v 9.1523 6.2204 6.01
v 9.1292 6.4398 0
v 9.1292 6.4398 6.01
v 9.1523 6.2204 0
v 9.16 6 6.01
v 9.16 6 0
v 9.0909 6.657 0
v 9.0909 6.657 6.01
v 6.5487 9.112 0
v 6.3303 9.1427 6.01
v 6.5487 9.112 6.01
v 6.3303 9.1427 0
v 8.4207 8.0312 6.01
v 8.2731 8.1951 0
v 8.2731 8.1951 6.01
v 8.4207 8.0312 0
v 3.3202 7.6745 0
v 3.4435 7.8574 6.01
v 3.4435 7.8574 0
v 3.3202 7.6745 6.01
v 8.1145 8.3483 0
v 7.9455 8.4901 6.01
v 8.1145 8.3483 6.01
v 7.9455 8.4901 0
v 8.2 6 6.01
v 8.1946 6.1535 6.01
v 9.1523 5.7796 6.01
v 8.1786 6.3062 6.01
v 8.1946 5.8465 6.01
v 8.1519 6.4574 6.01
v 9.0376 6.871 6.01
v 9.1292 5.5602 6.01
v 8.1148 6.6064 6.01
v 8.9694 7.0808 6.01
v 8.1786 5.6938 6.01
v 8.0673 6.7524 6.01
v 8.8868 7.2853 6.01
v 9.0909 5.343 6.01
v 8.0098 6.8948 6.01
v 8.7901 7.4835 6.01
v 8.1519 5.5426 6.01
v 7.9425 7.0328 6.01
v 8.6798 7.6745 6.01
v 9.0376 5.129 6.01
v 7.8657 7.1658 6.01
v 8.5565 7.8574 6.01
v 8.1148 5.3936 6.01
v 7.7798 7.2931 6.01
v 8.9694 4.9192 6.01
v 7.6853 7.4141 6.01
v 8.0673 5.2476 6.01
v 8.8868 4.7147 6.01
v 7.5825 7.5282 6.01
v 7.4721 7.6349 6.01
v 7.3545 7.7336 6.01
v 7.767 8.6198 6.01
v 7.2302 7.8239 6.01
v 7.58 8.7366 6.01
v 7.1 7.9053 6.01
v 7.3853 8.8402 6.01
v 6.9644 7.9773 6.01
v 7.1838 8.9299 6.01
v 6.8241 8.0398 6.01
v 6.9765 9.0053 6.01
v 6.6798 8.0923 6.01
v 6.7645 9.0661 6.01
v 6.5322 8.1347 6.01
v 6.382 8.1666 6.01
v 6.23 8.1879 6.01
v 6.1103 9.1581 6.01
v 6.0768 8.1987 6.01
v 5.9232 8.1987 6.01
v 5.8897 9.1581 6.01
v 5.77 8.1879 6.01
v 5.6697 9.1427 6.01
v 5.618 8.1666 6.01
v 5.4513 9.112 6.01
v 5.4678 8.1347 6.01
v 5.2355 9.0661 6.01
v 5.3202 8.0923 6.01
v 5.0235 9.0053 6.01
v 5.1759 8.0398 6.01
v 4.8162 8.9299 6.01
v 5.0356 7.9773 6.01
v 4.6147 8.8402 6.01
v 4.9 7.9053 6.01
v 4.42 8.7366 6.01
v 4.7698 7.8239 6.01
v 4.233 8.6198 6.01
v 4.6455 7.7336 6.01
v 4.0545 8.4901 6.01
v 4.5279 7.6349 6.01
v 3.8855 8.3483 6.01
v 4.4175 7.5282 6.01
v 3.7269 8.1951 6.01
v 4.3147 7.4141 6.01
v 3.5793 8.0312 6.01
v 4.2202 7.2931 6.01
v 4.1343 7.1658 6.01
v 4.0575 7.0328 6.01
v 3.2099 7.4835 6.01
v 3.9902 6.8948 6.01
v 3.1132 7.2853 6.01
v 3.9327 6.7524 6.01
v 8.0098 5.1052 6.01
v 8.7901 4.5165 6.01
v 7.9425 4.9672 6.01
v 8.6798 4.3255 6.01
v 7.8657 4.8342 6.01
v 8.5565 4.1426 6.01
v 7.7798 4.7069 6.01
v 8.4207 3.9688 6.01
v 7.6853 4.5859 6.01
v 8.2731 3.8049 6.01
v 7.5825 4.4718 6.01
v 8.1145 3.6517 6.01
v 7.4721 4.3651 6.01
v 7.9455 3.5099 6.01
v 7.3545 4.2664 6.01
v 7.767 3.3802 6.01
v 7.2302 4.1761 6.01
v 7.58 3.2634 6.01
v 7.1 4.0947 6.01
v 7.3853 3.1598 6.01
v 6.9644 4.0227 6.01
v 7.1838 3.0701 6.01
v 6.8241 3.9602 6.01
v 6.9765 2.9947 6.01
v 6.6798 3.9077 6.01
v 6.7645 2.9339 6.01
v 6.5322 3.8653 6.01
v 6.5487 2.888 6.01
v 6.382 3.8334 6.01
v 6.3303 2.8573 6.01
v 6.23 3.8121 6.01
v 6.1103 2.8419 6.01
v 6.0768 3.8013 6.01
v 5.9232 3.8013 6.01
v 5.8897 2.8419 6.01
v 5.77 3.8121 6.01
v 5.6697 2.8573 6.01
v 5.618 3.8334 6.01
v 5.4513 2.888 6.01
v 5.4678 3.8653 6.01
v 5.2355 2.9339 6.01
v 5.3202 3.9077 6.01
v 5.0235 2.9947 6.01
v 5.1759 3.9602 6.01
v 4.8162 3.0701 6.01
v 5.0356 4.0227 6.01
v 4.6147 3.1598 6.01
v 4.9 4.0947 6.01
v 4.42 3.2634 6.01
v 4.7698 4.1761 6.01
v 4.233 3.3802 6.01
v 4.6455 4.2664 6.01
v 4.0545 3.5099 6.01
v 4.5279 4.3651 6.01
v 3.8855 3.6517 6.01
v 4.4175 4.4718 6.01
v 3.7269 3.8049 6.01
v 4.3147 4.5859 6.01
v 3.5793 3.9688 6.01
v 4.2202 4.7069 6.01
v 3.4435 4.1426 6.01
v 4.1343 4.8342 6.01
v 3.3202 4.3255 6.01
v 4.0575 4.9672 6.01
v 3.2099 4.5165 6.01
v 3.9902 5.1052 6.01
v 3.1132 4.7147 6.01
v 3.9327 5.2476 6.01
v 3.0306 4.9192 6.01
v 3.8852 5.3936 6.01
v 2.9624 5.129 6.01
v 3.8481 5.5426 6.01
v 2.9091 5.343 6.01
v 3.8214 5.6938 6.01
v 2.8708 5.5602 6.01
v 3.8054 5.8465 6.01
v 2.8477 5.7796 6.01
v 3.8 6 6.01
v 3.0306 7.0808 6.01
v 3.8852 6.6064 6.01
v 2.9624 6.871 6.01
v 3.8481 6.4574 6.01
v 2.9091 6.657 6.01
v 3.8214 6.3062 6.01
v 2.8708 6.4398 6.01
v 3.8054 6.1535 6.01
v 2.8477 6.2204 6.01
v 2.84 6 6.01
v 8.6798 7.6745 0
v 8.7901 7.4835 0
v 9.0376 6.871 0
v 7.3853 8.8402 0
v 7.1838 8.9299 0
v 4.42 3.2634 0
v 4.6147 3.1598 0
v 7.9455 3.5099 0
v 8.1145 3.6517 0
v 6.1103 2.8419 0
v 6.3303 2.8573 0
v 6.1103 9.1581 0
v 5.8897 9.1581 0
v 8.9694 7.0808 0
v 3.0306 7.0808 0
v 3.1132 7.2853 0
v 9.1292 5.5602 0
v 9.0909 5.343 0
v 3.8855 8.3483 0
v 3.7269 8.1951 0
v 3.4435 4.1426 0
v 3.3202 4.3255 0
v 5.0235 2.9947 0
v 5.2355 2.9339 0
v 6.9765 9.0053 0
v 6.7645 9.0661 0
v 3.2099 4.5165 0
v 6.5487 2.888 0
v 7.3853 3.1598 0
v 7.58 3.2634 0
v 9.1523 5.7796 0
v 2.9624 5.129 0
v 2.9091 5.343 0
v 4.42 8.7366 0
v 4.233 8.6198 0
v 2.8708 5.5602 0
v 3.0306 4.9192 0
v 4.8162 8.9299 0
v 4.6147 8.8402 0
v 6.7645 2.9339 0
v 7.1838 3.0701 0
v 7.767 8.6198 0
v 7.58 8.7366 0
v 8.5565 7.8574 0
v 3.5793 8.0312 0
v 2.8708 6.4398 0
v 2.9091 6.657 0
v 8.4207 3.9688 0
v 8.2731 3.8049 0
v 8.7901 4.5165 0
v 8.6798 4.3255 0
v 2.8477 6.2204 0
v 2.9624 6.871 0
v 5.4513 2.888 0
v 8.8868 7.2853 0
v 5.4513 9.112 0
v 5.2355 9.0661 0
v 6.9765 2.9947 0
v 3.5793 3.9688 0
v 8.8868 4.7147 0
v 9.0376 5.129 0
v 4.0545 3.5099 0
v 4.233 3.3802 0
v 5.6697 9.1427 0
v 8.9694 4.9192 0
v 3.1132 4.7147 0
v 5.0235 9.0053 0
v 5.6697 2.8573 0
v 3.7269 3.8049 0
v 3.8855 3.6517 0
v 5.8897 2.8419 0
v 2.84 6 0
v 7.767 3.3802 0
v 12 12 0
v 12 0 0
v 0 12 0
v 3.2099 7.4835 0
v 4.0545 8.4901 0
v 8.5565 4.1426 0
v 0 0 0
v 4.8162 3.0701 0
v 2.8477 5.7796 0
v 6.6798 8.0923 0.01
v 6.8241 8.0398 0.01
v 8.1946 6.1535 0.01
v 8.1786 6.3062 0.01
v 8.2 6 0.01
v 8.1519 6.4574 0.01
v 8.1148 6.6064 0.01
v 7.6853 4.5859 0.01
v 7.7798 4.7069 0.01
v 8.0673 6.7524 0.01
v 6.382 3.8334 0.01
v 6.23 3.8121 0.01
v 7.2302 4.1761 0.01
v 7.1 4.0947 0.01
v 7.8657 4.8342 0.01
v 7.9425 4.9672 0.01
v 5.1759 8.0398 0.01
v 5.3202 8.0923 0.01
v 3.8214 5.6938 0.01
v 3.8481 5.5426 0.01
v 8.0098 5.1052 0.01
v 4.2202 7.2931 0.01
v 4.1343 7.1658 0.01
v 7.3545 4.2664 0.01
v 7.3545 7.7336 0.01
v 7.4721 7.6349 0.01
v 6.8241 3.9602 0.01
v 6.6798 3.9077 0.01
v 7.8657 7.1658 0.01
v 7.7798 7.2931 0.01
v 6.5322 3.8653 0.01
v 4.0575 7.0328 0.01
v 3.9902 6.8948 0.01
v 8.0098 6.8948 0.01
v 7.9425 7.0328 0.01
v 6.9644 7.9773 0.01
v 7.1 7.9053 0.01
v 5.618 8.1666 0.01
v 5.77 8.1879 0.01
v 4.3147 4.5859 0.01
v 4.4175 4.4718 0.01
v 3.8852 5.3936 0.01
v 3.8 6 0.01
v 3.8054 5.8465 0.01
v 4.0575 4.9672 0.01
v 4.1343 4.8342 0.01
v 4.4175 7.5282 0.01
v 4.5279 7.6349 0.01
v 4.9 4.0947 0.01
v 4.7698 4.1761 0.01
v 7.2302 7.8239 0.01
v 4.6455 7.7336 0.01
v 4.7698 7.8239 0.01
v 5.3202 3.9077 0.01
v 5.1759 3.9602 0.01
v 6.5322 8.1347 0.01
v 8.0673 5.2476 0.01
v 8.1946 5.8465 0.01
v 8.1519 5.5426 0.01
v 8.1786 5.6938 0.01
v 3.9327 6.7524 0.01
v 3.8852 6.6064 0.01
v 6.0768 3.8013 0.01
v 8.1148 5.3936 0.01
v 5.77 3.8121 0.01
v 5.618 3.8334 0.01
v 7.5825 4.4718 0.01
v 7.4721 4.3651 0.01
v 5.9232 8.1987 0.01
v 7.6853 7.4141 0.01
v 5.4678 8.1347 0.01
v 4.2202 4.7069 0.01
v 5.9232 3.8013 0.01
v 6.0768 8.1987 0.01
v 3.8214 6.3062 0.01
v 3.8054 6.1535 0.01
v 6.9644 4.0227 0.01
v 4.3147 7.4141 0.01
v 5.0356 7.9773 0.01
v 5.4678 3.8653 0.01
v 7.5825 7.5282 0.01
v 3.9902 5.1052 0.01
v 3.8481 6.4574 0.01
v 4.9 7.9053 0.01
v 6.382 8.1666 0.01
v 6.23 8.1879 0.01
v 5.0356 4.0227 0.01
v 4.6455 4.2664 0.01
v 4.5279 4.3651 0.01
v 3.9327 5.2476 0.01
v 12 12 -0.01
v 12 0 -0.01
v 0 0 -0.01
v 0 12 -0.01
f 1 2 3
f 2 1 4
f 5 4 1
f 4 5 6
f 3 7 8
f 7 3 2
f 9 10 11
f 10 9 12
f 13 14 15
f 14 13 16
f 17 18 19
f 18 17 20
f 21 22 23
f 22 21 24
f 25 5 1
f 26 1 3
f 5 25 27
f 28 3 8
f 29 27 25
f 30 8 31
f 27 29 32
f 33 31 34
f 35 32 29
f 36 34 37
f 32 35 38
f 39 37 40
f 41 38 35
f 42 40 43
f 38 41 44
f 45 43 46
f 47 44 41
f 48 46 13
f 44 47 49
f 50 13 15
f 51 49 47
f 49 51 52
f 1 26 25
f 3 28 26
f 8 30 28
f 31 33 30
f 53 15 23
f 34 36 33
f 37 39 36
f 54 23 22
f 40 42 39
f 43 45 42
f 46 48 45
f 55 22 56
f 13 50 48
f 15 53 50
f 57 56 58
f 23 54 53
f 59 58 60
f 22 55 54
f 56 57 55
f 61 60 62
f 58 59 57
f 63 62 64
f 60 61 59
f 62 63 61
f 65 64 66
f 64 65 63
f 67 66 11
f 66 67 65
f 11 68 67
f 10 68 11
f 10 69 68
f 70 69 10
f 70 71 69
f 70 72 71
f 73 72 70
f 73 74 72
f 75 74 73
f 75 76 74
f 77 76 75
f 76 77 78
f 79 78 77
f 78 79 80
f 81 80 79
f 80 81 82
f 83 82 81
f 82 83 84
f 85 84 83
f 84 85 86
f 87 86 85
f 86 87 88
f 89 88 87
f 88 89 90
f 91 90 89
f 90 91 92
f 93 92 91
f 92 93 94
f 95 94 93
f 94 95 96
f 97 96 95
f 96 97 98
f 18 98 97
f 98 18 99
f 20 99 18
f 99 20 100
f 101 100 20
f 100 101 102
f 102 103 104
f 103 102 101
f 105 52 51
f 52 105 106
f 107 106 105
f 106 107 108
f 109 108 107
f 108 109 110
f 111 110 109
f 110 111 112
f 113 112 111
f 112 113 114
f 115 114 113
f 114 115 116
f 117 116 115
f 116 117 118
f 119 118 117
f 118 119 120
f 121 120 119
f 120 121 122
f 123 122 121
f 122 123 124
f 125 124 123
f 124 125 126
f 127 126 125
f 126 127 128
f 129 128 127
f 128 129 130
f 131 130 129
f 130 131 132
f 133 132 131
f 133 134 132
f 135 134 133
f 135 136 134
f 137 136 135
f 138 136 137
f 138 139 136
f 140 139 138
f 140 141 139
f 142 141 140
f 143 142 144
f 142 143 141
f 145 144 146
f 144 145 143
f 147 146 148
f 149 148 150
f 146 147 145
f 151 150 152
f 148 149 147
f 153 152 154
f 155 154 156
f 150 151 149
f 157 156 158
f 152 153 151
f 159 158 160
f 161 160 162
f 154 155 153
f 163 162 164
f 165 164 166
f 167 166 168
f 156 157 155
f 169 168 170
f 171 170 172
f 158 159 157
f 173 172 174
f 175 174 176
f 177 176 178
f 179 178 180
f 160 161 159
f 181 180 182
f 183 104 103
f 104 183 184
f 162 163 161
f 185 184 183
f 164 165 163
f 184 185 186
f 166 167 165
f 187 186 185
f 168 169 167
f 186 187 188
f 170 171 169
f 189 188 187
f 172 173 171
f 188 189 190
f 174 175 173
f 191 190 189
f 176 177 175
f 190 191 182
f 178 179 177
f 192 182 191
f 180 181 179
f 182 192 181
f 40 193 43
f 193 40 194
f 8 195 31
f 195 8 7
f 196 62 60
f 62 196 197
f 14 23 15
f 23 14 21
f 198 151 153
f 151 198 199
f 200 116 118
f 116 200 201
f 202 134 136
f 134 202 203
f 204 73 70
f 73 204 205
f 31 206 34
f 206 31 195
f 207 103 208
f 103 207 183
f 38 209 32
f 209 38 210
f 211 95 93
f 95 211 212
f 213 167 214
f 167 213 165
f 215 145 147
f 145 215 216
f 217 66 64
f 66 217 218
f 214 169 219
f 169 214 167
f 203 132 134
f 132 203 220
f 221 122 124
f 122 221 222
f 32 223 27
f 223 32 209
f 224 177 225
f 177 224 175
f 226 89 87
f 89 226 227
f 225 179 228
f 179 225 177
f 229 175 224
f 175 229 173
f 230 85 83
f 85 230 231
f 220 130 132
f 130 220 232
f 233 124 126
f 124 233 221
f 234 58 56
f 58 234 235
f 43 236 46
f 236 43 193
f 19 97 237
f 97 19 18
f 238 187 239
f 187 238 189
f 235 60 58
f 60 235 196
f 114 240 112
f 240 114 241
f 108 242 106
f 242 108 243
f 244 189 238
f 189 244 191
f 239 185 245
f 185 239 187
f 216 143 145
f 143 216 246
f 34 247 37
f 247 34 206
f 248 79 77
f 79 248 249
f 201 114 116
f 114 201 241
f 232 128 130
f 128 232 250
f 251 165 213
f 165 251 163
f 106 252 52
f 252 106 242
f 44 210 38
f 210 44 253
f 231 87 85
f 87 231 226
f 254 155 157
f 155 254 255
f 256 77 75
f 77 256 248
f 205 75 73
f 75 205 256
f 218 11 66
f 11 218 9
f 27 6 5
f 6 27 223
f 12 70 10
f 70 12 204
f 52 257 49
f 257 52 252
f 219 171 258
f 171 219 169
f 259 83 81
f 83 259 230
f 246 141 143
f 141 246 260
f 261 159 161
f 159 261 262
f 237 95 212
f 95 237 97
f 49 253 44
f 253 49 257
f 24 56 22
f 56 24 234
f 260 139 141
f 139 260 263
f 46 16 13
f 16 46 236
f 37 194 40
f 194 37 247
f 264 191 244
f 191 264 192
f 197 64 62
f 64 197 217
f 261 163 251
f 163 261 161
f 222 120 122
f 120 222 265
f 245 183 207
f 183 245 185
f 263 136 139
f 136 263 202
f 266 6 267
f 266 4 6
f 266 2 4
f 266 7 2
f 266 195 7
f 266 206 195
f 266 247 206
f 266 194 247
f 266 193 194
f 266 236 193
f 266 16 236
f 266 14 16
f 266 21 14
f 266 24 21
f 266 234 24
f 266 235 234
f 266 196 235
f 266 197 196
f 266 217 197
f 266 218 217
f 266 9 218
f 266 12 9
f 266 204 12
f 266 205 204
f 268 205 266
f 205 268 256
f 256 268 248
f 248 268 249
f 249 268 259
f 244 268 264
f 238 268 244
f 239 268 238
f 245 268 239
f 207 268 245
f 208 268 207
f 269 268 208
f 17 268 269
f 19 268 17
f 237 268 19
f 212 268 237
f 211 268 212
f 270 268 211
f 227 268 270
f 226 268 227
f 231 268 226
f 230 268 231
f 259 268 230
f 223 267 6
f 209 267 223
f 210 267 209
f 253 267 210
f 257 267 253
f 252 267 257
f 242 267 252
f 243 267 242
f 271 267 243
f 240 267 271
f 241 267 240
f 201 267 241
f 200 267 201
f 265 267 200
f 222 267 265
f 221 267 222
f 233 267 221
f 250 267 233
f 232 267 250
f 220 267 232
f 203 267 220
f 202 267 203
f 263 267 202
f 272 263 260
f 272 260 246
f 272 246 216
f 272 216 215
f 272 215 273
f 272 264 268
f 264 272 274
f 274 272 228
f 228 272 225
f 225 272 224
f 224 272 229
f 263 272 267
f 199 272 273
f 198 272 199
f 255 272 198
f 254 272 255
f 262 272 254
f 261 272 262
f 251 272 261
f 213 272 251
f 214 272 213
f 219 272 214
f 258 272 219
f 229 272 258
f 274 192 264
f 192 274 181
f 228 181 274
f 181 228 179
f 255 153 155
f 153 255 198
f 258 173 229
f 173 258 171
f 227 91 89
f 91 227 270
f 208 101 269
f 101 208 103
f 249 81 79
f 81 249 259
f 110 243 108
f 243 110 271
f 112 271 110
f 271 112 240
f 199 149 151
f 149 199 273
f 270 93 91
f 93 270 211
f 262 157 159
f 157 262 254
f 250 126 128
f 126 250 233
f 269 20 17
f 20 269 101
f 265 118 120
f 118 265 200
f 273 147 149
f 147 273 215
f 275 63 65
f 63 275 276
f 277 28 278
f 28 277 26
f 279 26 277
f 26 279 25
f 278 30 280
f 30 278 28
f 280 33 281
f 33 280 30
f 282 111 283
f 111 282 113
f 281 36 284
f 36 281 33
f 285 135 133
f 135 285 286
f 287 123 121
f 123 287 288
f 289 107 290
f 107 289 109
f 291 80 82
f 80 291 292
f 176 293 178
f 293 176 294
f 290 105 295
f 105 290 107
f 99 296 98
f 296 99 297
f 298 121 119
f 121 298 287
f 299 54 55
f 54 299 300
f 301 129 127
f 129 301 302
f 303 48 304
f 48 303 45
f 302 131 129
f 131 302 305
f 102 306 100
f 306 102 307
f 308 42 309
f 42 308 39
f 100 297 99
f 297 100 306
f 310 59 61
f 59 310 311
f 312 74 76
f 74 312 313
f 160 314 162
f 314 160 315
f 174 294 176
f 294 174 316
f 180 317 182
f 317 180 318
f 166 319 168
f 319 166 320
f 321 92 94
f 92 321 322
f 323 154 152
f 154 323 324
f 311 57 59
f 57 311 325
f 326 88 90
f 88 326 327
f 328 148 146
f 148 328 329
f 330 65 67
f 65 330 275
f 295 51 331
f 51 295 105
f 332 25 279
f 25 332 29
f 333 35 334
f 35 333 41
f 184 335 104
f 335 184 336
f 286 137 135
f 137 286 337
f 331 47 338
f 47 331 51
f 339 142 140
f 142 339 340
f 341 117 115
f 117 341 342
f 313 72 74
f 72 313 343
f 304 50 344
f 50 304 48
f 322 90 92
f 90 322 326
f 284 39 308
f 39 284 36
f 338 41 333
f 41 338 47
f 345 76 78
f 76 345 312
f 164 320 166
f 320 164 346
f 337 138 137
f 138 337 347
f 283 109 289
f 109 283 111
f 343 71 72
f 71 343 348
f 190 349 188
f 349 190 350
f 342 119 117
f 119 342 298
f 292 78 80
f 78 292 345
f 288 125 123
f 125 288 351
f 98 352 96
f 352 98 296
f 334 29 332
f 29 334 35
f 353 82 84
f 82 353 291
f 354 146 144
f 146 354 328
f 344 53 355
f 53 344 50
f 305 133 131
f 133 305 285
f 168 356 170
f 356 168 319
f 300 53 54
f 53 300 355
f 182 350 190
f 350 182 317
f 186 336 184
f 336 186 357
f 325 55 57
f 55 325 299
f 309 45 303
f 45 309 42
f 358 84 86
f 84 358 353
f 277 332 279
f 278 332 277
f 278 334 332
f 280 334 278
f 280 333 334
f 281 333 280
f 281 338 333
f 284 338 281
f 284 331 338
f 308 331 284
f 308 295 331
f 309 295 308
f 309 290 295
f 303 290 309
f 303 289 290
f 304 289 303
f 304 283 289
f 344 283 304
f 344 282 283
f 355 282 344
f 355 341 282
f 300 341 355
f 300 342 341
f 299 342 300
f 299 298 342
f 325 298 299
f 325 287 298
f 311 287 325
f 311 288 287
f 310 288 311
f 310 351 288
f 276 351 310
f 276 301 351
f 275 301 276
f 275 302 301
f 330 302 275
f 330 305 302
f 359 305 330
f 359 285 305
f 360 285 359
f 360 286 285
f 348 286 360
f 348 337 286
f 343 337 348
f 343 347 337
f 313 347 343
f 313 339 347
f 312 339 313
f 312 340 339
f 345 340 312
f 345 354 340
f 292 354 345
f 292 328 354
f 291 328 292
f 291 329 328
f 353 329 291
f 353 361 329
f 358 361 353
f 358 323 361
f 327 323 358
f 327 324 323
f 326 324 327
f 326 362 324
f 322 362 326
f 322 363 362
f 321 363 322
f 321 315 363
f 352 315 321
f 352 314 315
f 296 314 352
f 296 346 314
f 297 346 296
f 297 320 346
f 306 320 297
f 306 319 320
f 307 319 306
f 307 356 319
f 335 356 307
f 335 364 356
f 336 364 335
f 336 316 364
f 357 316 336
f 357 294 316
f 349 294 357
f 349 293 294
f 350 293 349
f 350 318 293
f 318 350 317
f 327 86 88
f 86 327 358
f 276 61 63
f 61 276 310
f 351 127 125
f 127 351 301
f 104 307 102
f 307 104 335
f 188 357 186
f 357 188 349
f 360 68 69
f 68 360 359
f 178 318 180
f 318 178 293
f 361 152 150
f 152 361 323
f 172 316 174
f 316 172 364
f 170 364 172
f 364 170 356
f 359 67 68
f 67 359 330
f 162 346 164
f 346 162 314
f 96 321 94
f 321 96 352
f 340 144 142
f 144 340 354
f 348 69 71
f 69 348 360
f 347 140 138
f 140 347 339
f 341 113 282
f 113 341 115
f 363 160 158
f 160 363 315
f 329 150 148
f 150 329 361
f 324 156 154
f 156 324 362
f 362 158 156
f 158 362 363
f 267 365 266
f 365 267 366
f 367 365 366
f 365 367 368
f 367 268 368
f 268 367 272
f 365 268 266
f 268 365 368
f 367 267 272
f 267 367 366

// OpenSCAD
// file: ../Base/PlacementOptions.scad
// Fischertechnik Box Foundation
// Placement Options

// Alignment
NoAlign = 0;
AlignLeft = 1;
AlignBottom = 2;
AlignCenter = 3;
AlignRight = 4;
AlignTop = 5;

// Element rotation degree steps
rotations = [0, -90, -180, -270];

// Rotation
NoRotation = 0;
Rotate0 = 0;
Rotate90 = 1;
Rotate180 = 2;
Rotate270 = 3;

// Docking (seen from above)
NoDock = -1;
DockLeft = 0;
DockTop = 1;
DockRight = 2;
DockCorner = 2;
DockBottom = 3;

// Web corners
LowerLeft = 0;
UpperLeft = 1;
UpperRight = 2;
LowerRight = 3;

// Web position relative to corner
LeftOfCorner = 0;
RightOfCorner = 1;
// file: ../Base/Boxes.scad
// Fischertechnik Box Foundation
// Pre-designed Boxes

use <Constants.scad>

include <PlacementOptions.scad>

box190Width = 190;
box190Depth = 130;
box130Width = 130;
box130Depth = 95;

// Values are from an original ec3 box
topBottomDifference = 1.5;
outerHeight = 40;
baseThickness = 1.8;
innerHeight = outerHeight - baseThickness;
stackExcess = 5.7;
radius = 3.5;
wallThickness = 1.5;
tolerance = 0.2;

boxWallThickness = wallThickness;
boxBaseThickness = baseThickness;
boxWebWidth = 3.0;

// getBoxWallThickness()
// Gets the wall thickness of a Fischertechnik Box
function getBoxWallThickness() = boxWallThickness;

// getBoxUsageHeight(height = 38.2)
// Gets the usable height of a Fischertechnik box
// height = Outer height of the box from the bottom to the upper edge.
function getBoxUsageHeight(height = outerHeight) = height - baseThickness - stackExcess;

// getBoxInnerHeight()
// Gets the inner height of a Fischertechnik box, including the stack excess
function getBoxInnerHeight() = innerHeight;

// getBoxBaseThickness()
// Gets the thickness of the Fischertechnik box base.
function getBoxBaseThickness() = boxBaseThickness;

// getBoxWebWidth()
// Gets the width of a box web
function getBoxWebWidth() = boxWebWidth;

// getBox190Space()
// Gets the usable inner space of a Box 190 as an x/y-list
function getBox190Space() = [
    box190Width - 2*getBoxWallThickness() - topBottomDifference, 
    box190Depth - 2*getBoxWallThickness() - topBottomDifference ];

// RoundedCornerPlate(width, depth, height, radius)
// Creates a body plate with rounded corners for a box. Used
// also to create the complete box with the hull module.
// width = Width of the plate
// depth = depth of the plate 
// height = thickness of the plate
// radius = radius of the rounded corner
module RoundedCornerPlate(width, depth, height, radius) {
    translate([radius, radius])
    hull() {
        w = width-2*radius;
        d = depth-2*radius;
        cube([w, d, height]);
        cylinder(height, r=radius, $fn=getFragments());
        translate([w, 0])
            cylinder(height, r=radius, $fn=getFragments());
        translate([w, d])
            cylinder(height, r=radius, $fn=getFragments());
        translate([0, d])
            cylinder(height, r=radius, $fn=getFragments());
    }
}

// BoxBase(width, depth)
// Creates an empty stackable Fischertechnik compatible box
// width = Outer width of the box (190, 130, ...)
// depth = Outer depth of the box (130, 95, ...)

module BoxBase(width, depth, height=outerHeight) {    
    thinPlate = 0.01;

    innerHeight = height - baseThickness;    
    
    module Body(tolerance=tolerance) {
        hull() {
            // Bottom with tolerance to fit into the original boxes when stacked
            translate([-wallThickness+tolerance, -wallThickness+tolerance, -baseThickness])
                RoundedCornerPlate(width-topBottomDifference-2*tolerance, depth-topBottomDifference-2*tolerance, thinPlate, radius);
            
            // Top
            translate([-wallThickness-topBottomDifference/2, -wallThickness-topBottomDifference/2, innerHeight-thinPlate])
                RoundedCornerPlate(width, depth, thinPlate, radius);
         }
    }

    module Cutoff() {
        hull() {
            coWidth = width - 2*wallThickness;
            coDepth = depth - 2*wallThickness;
            
            // Bottom
            RoundedCornerPlate(coWidth-topBottomDifference, coDepth-topBottomDifference, thinPlate, radius);

            // Top
            translate([-topBottomDifference/2, -topBottomDifference/2, innerHeight+thinPlate]) 
                RoundedCornerPlate(coWidth, coDepth, thinPlate, radius);
        }
    }
    
    difference() {        
        Body();
        Cutoff();
        stackOffset = innerHeight - stackExcess;
        translate([0, 0, stackOffset + baseThickness])
            Body(tolerance=0);
    }
}

// Creates the Fischertechnik empty box 130x190 mm and places it at position 0,0
// 190x130 are the outer sizes, the inner space is slightly smaller. Use getBox190Space() to get the inner sizes.
// The box is positioned that the usable inner space is at the 0,0,0 position.

module Box190() {
    BoxBase(box190Width, box190Depth);
}

// Gets the usable inner space of a Box 130 as an x/y-list
function getBox130Space() = [
    box130Width - 2*getBoxWallThickness() - topBottomDifference, 
    box130Depth - 2*getBoxWallThickness() - topBottomDifference ];

// Creates the Fischertechnik empty box 95x130 mm and places it at position 0,0
// 190x130 are the outer sizes, the inner space is slightly smaller. Use getBox190Space() to get the inner sizes.
// The box is positioned that the usable inner space is at the 0,0,0 position.

module Box130() {
    BoxBase(box130Width, box130Depth);
}

// Creates a web at the specified box walls
// corner 0 = LowerLeft, 1 = UpperLeft, 2 = UpperRight, 3 = LowerRight
// side 0 = LeftOfCorner, 1 = RightOfCorner
// distance = Distance in mm from the corner
// boxSpace = inner width and depth of the box (default: Box 190)
// webWidth = length of the web (default is 3 mms)
// webThickness = thickness of the web (default is 1 mm)
// height = Height of the web (standard is getBoxUsageHeight())
// sink = How much of the web is sunk into the wall

module BoxWeb(
    corner, 
    side, 
    distance, 
    boxSpace=getBox190Space(), 
    webWidth=getBoxWebWidth(), 
    webThickness=1.0, 
    height=getBoxUsageHeight(),
    sink = getBoxWallThickness()/2) {
    width = (corner % 2 == 0) ? 
            (side == LeftOfCorner ? webWidth : webThickness) :
            (side == LeftOfCorner ? webThickness : webWidth);

    depth = (corner % 2 == 0) ? 
            (side == RightOfCorner ? webWidth : webThickness) :
            (side == RightOfCorner ? webThickness : webWidth);
    
    xDiff = corner == LowerLeft ? 
                (side == LeftOfCorner ? -sink : distance) :
            (corner == UpperLeft ?                
                (side == LeftOfCorner ? distance : -sink) :
            (corner == UpperRight ?
                (side == LeftOfCorner ? boxSpace.x-webWidth+sink : boxSpace.x-distance-webThickness) :
                (side == LeftOfCorner ? boxSpace.x-distance-webThickness: boxSpace.x-webWidth+sink)));

    yDiff = corner == LowerLeft ? 
                (side == RightOfCorner ? -sink : distance) :
            (corner == UpperLeft ?
                (side == RightOfCorner ? boxSpace.y-distance-webThickness : boxSpace.y-webWidth+sink) :
            (corner == UpperRight ?
                (side == RightOfCorner ? boxSpace.y-webWidth+sink : boxSpace.y-distance-webThickness) :
                (side == RightOfCorner ? distance : -sink)));
    
    translate([xDiff, yDiff, -getExcess()])
        cube([width, depth, height + 2*getExcess()]);
}
// file: ../Base/Rotation.scad
// Fischertechnik Box Foundation
// Geometry Helpers Rotation

include <PlacementOptions.scad>

// getRotatedSpace(space, rotation=NoRotation)
// Rotates the space dependent on the specified rotation

function getRotatedSpace(space, rotation=NoRotation) = [
    (rotation == Rotate90 || rotation == Rotate270) ? space.y : space.x,
    (rotation == Rotate90 || rotation == Rotate270) ? space.x : space.y
];

// Rotates the given space around the fixed left lower corner
// space = the space the children needs as width/depth list [width,depth]
// rotation = 0 Rotate0 degrees, 1 Rotate90 degrees, 2 Rotate180 degrees, 3 Rotate270 degrees (equivalent to -90)

module RotateFix(space, rotation=NoRotation) {
    dy = (rotation == Rotate0 || rotation == Rotate270) ? 0 :
        (rotation == Rotate90) ? space.x :
        space.y;
    dx = (rotation < Rotate180) ? 0 :
        (rotation == Rotate180) ? space.x :
        space.y;
    
    translate([dx, dy, 0])
        rotate([0, 0, rotations[rotation]])
            children();
}
// file: ../Base/Alignment.scad
// Fischertechnik Box Foundation
// Geometry Helpers Alignment

include <PlacementOptions.scad>

// getAlignedX(elementWidth, spaceWidth, align=AlignRight, offset=0)
// Gets the aligned X offset of an element with the given
// width in the given space.
// elementWidth = The width of the element to positon
// spaceWidth = The space where the element should be aligned
// align = 0 AlignLeft, 1 AlignCenter, 2 AlignRight
// offset = an optional offset from the aligned position. When
// aligned left or centered, then positive values are in X direction.
// When aligned right then positive values are in negative X direction.

function getAlignedX(elementWidth, spaceWidth, align=AlignRight, offset=0) =
    (align == AlignLeft) ?
        offset :
        ((align == AlignCenter) ?
        (spaceWidth - elementWidth)/2 + offset :
        spaceWidth - offset - elementWidth);

// getAlignedY(elementDepth, spaceDepth, align=AlignTop, offset=0)
// Gets the aligned Y offset of an element with the given
// depth in the given space.
// elementDepth = The depth of the element to positon
// spaceDepth = The space where the element should be aligned
// align = 0 AlignBottom, 1 AlignCenter, 2 AlignTop
// offset = an optional offset from the aligned position. When
// aligned bottom or centered, then positive values are in Y direction.
// When aligned top then positive values are in negative Y direction.

function getAlignedY(elementDepth, spaceDepth, align=AlignTop, offset=0) =
    (align == AlignBottom) ?
        offset :
        ((align == AlignCenter) ?
        (spaceDepth - elementDepth)/2 + offset :
        spaceDepth - offset - elementDepth);
// file: ../Base/Placement.scad
// Fischertechnik Box Foundation
// Geometry Helpers Placement

use <Constants.scad>
use <Alignment.scad>
use <Rotation.scad>
use <Boxes.scad>

include <PlacementOptions.scad>

// Place(x=0, y=0, elementSpace=[0,0], alignX=AlignLeft, alignY=AlignBottom, rotation=Rotate0, boxSpace=getBox190Space())
// Places the child at the specified position
// y = Y-Position. This is a relative position when an X aligment is specified.
// x = X-Position. This is a relative position when an Y aligment is specified.
// elementSpace = space of the element to be placed [x,y]
// alignX = -1=NoAlign, 0 AlignLeft, 1 AlignCenter, 3 AlignRight (elementSpace and boxSpace required!)
// alignY = -1=NoAlign, 2 AlignBottom, 1 AlignCenter, 4 AlignTop (elementSpace and boxSpace required!)
// rotation = 0 Rotate0 0 degrees, 1 Rotate90 90 degrees, 
// 2 Rotate180 180 degrees, 3 Rotate270 270 degrees (equivalent to -90)
// boxSpace = Inner space of the box where the placement occurs [x,y] - default is Box 190x130 inner space

module Place(x=0, y=0, elementSpace=[0,0], 
  alignX=AlignLeft, alignY=AlignBottom, 
  rotation=NoRotation, boxSpace=getBox190Space()) {

    module Position(x, y, space, rotation=Rotate0) {
        translate([x, y, 0])
            RotateFix(space, rotation)
                children();
    }

    space = getRotatedSpace(elementSpace, rotation);
    alignedX = getAlignedX(space.x, boxSpace.x, alignX, x);
    alignedY = getAlignedY(space.y, boxSpace.y, alignY, y);
    Position(alignedX, alignedY, elementSpace, rotation)
        children();
}

// Center(space=getBox130Space(), elementSpace=[0,0])
// space = Space where the children is centered. For cylinder use centered=true and no elementSpace.
// elementSpace = space of the element to be centered [x,y]

module Center(space=getBox190Space(), elementSpace=[0,0]) {
    Place(elementSpace=elementSpace, boxSpace=space, alignX=AlignCenter, alignY=AlignCenter)
        children();
}

// CenterHorizontal(width=0, y=0, offset=0, space=getBox130Space())
// width = Width of the element to be placed.
// y = Y position of the element
// offset = Offset from the center position (negative will be left of the center)
// space = Space where the element is placed

module CenterHorizontal(width=0, y=0, offset=0, space=getBox190Space()) {
    Place(x=offset, y=y, elementSpace=[width, 0], boxSpace=space, alignX=AlignCenter)
        children(0);
}

// CenterVertical(depth=0, x=0, offset=0, space=getBox130Space())
// depth = Depth of the element to be placed.
// x = X position of the element
// offset = Offset from the center position (negative will be down of the center)
// space = Space where the element is placed

module CenterVertical(depth=0, x=0, offset=0, space=getBox190Space()) {
    Place(x=x, y=offset, elementSpace=[0, depth], boxSpace=space, alignY=AlignCenter)
        children(0);
}

// getIsVertical(align)
// True if the specified alignment needs a vertical orientation for a divider (AlignRight, AlignLeft)

function getIsVertical(align) = (align == AlignRight || align == AlignLeft);

// getIsHorizontal(align)
// True if the specified alignment needs a horizontal orientation for a divider (AlignTop, AlignBottom)

function getIsHorizontal(align) = (align == AlignTop || align == AlignBottom);
// file: ../Base/Constants.scad
// Fischertechnik Box Foundation
// Constants

// Constant values necessary for multiple elements

// Base constants
dividerThickness = 1.2;
excess = 0.01;
fragments = 90;
tolerance = 0.8;

// Gets the thickness of a divider 
function getDividerThickness() = dividerThickness;

// Gets the excess that is used to merge walls into each other
function getExcess() = excess;

// Gets amount of fragments of a cylinder
function getFragments() = fragments;

// Gets the inner tolerance of a frame to each side
function getTolerance() = tolerance;


// Fischertechnik specific constants
axisDiameter = 4;
axisBottomDiameter = axisDiameter + 1;
axisTolerance = 0.2;

// Gets axis diameter of Fischertechnik axis
function getAxisDiameter() = axisDiameter;

// Gets axis diameter tolerance (subtracted for element axis)
function getAxisTolerance() = axisTolerance;

// Gets the axis diameter for standing axis
function getStandAxisDiameter() = getAxisDiameter() - getAxisTolerance();

// Gets axis bottom diameter for thicker part at the bottom
function getAxisBottomDiameter() = axisBottomDiameter;

pinHeight = 2.5;

// gets the height of a connecting pin
function getPinHeight() = pinHeight;

standardEdgeDistance = 2.5;
standardWebDistance = 11.5;
standardCornerLength = 15;

// gets the standard distance to the wall of the box for dockable frames with webs
function getStandardEdgeDistance() = standardEdgeDistance;

// gets the standard distance of each web to the corner of the dockable frame
function getStandardWebDistance() = standardWebDistance;

// gets the standard length of the corner walls of a dockable frame
function getStandardCornerLength() = standardCornerLength;

tubeWallFactor = 0.8;

// gets the wall thickness of a tube.
function getTubeWallThickness() = tubeWallFactor * getDividerThickness();

smallPartsFrameHeight = 20;

// gets the frame height for docked small parts boxes.
function getSmallPartsFrameHeight() = smallPartsFrameHeight;

hubRingDiameter = 19.5;
hubRingLevelDiameter = 21;

// gets the diameter of a tube matching the inner ring of a wheel
function getHubRingDiameter() = hubRingDiameter;

// gets the diameter of a hub tube with a thicker diameter
function getHubRingLevelDiameter() = hubRingLevelDiameter;
// main file
// Fischertechnik Box Library
// Cylinder for standing 30 mm axis
// 31034

use <../Base/Constants.scad>
use <../Base/Placement.scad>
use <../ModelBase/Simple.scad>
use <../ModelBase/Complex.scad>

/* [Hidden] */
width = 12;
depth = 12;
height = 6;

// getCylinderAxis30Space()
// Gets the space the cylinder for a 30 mm axis needs

function getCylinderAxis30Space() = [width, depth, height];

// CylinderAxis30()
// Standing cylinder for axis 30
// 31034

module CylinderAxis30() {
    Space(getCylinderAxis30Space());
    
    Center(getCylinderAxis30Space())
        Tube(height, innerDiameter=getFrameAxisDepth());
}

// Tests
color("lightgray")
CylinderAxis30();
